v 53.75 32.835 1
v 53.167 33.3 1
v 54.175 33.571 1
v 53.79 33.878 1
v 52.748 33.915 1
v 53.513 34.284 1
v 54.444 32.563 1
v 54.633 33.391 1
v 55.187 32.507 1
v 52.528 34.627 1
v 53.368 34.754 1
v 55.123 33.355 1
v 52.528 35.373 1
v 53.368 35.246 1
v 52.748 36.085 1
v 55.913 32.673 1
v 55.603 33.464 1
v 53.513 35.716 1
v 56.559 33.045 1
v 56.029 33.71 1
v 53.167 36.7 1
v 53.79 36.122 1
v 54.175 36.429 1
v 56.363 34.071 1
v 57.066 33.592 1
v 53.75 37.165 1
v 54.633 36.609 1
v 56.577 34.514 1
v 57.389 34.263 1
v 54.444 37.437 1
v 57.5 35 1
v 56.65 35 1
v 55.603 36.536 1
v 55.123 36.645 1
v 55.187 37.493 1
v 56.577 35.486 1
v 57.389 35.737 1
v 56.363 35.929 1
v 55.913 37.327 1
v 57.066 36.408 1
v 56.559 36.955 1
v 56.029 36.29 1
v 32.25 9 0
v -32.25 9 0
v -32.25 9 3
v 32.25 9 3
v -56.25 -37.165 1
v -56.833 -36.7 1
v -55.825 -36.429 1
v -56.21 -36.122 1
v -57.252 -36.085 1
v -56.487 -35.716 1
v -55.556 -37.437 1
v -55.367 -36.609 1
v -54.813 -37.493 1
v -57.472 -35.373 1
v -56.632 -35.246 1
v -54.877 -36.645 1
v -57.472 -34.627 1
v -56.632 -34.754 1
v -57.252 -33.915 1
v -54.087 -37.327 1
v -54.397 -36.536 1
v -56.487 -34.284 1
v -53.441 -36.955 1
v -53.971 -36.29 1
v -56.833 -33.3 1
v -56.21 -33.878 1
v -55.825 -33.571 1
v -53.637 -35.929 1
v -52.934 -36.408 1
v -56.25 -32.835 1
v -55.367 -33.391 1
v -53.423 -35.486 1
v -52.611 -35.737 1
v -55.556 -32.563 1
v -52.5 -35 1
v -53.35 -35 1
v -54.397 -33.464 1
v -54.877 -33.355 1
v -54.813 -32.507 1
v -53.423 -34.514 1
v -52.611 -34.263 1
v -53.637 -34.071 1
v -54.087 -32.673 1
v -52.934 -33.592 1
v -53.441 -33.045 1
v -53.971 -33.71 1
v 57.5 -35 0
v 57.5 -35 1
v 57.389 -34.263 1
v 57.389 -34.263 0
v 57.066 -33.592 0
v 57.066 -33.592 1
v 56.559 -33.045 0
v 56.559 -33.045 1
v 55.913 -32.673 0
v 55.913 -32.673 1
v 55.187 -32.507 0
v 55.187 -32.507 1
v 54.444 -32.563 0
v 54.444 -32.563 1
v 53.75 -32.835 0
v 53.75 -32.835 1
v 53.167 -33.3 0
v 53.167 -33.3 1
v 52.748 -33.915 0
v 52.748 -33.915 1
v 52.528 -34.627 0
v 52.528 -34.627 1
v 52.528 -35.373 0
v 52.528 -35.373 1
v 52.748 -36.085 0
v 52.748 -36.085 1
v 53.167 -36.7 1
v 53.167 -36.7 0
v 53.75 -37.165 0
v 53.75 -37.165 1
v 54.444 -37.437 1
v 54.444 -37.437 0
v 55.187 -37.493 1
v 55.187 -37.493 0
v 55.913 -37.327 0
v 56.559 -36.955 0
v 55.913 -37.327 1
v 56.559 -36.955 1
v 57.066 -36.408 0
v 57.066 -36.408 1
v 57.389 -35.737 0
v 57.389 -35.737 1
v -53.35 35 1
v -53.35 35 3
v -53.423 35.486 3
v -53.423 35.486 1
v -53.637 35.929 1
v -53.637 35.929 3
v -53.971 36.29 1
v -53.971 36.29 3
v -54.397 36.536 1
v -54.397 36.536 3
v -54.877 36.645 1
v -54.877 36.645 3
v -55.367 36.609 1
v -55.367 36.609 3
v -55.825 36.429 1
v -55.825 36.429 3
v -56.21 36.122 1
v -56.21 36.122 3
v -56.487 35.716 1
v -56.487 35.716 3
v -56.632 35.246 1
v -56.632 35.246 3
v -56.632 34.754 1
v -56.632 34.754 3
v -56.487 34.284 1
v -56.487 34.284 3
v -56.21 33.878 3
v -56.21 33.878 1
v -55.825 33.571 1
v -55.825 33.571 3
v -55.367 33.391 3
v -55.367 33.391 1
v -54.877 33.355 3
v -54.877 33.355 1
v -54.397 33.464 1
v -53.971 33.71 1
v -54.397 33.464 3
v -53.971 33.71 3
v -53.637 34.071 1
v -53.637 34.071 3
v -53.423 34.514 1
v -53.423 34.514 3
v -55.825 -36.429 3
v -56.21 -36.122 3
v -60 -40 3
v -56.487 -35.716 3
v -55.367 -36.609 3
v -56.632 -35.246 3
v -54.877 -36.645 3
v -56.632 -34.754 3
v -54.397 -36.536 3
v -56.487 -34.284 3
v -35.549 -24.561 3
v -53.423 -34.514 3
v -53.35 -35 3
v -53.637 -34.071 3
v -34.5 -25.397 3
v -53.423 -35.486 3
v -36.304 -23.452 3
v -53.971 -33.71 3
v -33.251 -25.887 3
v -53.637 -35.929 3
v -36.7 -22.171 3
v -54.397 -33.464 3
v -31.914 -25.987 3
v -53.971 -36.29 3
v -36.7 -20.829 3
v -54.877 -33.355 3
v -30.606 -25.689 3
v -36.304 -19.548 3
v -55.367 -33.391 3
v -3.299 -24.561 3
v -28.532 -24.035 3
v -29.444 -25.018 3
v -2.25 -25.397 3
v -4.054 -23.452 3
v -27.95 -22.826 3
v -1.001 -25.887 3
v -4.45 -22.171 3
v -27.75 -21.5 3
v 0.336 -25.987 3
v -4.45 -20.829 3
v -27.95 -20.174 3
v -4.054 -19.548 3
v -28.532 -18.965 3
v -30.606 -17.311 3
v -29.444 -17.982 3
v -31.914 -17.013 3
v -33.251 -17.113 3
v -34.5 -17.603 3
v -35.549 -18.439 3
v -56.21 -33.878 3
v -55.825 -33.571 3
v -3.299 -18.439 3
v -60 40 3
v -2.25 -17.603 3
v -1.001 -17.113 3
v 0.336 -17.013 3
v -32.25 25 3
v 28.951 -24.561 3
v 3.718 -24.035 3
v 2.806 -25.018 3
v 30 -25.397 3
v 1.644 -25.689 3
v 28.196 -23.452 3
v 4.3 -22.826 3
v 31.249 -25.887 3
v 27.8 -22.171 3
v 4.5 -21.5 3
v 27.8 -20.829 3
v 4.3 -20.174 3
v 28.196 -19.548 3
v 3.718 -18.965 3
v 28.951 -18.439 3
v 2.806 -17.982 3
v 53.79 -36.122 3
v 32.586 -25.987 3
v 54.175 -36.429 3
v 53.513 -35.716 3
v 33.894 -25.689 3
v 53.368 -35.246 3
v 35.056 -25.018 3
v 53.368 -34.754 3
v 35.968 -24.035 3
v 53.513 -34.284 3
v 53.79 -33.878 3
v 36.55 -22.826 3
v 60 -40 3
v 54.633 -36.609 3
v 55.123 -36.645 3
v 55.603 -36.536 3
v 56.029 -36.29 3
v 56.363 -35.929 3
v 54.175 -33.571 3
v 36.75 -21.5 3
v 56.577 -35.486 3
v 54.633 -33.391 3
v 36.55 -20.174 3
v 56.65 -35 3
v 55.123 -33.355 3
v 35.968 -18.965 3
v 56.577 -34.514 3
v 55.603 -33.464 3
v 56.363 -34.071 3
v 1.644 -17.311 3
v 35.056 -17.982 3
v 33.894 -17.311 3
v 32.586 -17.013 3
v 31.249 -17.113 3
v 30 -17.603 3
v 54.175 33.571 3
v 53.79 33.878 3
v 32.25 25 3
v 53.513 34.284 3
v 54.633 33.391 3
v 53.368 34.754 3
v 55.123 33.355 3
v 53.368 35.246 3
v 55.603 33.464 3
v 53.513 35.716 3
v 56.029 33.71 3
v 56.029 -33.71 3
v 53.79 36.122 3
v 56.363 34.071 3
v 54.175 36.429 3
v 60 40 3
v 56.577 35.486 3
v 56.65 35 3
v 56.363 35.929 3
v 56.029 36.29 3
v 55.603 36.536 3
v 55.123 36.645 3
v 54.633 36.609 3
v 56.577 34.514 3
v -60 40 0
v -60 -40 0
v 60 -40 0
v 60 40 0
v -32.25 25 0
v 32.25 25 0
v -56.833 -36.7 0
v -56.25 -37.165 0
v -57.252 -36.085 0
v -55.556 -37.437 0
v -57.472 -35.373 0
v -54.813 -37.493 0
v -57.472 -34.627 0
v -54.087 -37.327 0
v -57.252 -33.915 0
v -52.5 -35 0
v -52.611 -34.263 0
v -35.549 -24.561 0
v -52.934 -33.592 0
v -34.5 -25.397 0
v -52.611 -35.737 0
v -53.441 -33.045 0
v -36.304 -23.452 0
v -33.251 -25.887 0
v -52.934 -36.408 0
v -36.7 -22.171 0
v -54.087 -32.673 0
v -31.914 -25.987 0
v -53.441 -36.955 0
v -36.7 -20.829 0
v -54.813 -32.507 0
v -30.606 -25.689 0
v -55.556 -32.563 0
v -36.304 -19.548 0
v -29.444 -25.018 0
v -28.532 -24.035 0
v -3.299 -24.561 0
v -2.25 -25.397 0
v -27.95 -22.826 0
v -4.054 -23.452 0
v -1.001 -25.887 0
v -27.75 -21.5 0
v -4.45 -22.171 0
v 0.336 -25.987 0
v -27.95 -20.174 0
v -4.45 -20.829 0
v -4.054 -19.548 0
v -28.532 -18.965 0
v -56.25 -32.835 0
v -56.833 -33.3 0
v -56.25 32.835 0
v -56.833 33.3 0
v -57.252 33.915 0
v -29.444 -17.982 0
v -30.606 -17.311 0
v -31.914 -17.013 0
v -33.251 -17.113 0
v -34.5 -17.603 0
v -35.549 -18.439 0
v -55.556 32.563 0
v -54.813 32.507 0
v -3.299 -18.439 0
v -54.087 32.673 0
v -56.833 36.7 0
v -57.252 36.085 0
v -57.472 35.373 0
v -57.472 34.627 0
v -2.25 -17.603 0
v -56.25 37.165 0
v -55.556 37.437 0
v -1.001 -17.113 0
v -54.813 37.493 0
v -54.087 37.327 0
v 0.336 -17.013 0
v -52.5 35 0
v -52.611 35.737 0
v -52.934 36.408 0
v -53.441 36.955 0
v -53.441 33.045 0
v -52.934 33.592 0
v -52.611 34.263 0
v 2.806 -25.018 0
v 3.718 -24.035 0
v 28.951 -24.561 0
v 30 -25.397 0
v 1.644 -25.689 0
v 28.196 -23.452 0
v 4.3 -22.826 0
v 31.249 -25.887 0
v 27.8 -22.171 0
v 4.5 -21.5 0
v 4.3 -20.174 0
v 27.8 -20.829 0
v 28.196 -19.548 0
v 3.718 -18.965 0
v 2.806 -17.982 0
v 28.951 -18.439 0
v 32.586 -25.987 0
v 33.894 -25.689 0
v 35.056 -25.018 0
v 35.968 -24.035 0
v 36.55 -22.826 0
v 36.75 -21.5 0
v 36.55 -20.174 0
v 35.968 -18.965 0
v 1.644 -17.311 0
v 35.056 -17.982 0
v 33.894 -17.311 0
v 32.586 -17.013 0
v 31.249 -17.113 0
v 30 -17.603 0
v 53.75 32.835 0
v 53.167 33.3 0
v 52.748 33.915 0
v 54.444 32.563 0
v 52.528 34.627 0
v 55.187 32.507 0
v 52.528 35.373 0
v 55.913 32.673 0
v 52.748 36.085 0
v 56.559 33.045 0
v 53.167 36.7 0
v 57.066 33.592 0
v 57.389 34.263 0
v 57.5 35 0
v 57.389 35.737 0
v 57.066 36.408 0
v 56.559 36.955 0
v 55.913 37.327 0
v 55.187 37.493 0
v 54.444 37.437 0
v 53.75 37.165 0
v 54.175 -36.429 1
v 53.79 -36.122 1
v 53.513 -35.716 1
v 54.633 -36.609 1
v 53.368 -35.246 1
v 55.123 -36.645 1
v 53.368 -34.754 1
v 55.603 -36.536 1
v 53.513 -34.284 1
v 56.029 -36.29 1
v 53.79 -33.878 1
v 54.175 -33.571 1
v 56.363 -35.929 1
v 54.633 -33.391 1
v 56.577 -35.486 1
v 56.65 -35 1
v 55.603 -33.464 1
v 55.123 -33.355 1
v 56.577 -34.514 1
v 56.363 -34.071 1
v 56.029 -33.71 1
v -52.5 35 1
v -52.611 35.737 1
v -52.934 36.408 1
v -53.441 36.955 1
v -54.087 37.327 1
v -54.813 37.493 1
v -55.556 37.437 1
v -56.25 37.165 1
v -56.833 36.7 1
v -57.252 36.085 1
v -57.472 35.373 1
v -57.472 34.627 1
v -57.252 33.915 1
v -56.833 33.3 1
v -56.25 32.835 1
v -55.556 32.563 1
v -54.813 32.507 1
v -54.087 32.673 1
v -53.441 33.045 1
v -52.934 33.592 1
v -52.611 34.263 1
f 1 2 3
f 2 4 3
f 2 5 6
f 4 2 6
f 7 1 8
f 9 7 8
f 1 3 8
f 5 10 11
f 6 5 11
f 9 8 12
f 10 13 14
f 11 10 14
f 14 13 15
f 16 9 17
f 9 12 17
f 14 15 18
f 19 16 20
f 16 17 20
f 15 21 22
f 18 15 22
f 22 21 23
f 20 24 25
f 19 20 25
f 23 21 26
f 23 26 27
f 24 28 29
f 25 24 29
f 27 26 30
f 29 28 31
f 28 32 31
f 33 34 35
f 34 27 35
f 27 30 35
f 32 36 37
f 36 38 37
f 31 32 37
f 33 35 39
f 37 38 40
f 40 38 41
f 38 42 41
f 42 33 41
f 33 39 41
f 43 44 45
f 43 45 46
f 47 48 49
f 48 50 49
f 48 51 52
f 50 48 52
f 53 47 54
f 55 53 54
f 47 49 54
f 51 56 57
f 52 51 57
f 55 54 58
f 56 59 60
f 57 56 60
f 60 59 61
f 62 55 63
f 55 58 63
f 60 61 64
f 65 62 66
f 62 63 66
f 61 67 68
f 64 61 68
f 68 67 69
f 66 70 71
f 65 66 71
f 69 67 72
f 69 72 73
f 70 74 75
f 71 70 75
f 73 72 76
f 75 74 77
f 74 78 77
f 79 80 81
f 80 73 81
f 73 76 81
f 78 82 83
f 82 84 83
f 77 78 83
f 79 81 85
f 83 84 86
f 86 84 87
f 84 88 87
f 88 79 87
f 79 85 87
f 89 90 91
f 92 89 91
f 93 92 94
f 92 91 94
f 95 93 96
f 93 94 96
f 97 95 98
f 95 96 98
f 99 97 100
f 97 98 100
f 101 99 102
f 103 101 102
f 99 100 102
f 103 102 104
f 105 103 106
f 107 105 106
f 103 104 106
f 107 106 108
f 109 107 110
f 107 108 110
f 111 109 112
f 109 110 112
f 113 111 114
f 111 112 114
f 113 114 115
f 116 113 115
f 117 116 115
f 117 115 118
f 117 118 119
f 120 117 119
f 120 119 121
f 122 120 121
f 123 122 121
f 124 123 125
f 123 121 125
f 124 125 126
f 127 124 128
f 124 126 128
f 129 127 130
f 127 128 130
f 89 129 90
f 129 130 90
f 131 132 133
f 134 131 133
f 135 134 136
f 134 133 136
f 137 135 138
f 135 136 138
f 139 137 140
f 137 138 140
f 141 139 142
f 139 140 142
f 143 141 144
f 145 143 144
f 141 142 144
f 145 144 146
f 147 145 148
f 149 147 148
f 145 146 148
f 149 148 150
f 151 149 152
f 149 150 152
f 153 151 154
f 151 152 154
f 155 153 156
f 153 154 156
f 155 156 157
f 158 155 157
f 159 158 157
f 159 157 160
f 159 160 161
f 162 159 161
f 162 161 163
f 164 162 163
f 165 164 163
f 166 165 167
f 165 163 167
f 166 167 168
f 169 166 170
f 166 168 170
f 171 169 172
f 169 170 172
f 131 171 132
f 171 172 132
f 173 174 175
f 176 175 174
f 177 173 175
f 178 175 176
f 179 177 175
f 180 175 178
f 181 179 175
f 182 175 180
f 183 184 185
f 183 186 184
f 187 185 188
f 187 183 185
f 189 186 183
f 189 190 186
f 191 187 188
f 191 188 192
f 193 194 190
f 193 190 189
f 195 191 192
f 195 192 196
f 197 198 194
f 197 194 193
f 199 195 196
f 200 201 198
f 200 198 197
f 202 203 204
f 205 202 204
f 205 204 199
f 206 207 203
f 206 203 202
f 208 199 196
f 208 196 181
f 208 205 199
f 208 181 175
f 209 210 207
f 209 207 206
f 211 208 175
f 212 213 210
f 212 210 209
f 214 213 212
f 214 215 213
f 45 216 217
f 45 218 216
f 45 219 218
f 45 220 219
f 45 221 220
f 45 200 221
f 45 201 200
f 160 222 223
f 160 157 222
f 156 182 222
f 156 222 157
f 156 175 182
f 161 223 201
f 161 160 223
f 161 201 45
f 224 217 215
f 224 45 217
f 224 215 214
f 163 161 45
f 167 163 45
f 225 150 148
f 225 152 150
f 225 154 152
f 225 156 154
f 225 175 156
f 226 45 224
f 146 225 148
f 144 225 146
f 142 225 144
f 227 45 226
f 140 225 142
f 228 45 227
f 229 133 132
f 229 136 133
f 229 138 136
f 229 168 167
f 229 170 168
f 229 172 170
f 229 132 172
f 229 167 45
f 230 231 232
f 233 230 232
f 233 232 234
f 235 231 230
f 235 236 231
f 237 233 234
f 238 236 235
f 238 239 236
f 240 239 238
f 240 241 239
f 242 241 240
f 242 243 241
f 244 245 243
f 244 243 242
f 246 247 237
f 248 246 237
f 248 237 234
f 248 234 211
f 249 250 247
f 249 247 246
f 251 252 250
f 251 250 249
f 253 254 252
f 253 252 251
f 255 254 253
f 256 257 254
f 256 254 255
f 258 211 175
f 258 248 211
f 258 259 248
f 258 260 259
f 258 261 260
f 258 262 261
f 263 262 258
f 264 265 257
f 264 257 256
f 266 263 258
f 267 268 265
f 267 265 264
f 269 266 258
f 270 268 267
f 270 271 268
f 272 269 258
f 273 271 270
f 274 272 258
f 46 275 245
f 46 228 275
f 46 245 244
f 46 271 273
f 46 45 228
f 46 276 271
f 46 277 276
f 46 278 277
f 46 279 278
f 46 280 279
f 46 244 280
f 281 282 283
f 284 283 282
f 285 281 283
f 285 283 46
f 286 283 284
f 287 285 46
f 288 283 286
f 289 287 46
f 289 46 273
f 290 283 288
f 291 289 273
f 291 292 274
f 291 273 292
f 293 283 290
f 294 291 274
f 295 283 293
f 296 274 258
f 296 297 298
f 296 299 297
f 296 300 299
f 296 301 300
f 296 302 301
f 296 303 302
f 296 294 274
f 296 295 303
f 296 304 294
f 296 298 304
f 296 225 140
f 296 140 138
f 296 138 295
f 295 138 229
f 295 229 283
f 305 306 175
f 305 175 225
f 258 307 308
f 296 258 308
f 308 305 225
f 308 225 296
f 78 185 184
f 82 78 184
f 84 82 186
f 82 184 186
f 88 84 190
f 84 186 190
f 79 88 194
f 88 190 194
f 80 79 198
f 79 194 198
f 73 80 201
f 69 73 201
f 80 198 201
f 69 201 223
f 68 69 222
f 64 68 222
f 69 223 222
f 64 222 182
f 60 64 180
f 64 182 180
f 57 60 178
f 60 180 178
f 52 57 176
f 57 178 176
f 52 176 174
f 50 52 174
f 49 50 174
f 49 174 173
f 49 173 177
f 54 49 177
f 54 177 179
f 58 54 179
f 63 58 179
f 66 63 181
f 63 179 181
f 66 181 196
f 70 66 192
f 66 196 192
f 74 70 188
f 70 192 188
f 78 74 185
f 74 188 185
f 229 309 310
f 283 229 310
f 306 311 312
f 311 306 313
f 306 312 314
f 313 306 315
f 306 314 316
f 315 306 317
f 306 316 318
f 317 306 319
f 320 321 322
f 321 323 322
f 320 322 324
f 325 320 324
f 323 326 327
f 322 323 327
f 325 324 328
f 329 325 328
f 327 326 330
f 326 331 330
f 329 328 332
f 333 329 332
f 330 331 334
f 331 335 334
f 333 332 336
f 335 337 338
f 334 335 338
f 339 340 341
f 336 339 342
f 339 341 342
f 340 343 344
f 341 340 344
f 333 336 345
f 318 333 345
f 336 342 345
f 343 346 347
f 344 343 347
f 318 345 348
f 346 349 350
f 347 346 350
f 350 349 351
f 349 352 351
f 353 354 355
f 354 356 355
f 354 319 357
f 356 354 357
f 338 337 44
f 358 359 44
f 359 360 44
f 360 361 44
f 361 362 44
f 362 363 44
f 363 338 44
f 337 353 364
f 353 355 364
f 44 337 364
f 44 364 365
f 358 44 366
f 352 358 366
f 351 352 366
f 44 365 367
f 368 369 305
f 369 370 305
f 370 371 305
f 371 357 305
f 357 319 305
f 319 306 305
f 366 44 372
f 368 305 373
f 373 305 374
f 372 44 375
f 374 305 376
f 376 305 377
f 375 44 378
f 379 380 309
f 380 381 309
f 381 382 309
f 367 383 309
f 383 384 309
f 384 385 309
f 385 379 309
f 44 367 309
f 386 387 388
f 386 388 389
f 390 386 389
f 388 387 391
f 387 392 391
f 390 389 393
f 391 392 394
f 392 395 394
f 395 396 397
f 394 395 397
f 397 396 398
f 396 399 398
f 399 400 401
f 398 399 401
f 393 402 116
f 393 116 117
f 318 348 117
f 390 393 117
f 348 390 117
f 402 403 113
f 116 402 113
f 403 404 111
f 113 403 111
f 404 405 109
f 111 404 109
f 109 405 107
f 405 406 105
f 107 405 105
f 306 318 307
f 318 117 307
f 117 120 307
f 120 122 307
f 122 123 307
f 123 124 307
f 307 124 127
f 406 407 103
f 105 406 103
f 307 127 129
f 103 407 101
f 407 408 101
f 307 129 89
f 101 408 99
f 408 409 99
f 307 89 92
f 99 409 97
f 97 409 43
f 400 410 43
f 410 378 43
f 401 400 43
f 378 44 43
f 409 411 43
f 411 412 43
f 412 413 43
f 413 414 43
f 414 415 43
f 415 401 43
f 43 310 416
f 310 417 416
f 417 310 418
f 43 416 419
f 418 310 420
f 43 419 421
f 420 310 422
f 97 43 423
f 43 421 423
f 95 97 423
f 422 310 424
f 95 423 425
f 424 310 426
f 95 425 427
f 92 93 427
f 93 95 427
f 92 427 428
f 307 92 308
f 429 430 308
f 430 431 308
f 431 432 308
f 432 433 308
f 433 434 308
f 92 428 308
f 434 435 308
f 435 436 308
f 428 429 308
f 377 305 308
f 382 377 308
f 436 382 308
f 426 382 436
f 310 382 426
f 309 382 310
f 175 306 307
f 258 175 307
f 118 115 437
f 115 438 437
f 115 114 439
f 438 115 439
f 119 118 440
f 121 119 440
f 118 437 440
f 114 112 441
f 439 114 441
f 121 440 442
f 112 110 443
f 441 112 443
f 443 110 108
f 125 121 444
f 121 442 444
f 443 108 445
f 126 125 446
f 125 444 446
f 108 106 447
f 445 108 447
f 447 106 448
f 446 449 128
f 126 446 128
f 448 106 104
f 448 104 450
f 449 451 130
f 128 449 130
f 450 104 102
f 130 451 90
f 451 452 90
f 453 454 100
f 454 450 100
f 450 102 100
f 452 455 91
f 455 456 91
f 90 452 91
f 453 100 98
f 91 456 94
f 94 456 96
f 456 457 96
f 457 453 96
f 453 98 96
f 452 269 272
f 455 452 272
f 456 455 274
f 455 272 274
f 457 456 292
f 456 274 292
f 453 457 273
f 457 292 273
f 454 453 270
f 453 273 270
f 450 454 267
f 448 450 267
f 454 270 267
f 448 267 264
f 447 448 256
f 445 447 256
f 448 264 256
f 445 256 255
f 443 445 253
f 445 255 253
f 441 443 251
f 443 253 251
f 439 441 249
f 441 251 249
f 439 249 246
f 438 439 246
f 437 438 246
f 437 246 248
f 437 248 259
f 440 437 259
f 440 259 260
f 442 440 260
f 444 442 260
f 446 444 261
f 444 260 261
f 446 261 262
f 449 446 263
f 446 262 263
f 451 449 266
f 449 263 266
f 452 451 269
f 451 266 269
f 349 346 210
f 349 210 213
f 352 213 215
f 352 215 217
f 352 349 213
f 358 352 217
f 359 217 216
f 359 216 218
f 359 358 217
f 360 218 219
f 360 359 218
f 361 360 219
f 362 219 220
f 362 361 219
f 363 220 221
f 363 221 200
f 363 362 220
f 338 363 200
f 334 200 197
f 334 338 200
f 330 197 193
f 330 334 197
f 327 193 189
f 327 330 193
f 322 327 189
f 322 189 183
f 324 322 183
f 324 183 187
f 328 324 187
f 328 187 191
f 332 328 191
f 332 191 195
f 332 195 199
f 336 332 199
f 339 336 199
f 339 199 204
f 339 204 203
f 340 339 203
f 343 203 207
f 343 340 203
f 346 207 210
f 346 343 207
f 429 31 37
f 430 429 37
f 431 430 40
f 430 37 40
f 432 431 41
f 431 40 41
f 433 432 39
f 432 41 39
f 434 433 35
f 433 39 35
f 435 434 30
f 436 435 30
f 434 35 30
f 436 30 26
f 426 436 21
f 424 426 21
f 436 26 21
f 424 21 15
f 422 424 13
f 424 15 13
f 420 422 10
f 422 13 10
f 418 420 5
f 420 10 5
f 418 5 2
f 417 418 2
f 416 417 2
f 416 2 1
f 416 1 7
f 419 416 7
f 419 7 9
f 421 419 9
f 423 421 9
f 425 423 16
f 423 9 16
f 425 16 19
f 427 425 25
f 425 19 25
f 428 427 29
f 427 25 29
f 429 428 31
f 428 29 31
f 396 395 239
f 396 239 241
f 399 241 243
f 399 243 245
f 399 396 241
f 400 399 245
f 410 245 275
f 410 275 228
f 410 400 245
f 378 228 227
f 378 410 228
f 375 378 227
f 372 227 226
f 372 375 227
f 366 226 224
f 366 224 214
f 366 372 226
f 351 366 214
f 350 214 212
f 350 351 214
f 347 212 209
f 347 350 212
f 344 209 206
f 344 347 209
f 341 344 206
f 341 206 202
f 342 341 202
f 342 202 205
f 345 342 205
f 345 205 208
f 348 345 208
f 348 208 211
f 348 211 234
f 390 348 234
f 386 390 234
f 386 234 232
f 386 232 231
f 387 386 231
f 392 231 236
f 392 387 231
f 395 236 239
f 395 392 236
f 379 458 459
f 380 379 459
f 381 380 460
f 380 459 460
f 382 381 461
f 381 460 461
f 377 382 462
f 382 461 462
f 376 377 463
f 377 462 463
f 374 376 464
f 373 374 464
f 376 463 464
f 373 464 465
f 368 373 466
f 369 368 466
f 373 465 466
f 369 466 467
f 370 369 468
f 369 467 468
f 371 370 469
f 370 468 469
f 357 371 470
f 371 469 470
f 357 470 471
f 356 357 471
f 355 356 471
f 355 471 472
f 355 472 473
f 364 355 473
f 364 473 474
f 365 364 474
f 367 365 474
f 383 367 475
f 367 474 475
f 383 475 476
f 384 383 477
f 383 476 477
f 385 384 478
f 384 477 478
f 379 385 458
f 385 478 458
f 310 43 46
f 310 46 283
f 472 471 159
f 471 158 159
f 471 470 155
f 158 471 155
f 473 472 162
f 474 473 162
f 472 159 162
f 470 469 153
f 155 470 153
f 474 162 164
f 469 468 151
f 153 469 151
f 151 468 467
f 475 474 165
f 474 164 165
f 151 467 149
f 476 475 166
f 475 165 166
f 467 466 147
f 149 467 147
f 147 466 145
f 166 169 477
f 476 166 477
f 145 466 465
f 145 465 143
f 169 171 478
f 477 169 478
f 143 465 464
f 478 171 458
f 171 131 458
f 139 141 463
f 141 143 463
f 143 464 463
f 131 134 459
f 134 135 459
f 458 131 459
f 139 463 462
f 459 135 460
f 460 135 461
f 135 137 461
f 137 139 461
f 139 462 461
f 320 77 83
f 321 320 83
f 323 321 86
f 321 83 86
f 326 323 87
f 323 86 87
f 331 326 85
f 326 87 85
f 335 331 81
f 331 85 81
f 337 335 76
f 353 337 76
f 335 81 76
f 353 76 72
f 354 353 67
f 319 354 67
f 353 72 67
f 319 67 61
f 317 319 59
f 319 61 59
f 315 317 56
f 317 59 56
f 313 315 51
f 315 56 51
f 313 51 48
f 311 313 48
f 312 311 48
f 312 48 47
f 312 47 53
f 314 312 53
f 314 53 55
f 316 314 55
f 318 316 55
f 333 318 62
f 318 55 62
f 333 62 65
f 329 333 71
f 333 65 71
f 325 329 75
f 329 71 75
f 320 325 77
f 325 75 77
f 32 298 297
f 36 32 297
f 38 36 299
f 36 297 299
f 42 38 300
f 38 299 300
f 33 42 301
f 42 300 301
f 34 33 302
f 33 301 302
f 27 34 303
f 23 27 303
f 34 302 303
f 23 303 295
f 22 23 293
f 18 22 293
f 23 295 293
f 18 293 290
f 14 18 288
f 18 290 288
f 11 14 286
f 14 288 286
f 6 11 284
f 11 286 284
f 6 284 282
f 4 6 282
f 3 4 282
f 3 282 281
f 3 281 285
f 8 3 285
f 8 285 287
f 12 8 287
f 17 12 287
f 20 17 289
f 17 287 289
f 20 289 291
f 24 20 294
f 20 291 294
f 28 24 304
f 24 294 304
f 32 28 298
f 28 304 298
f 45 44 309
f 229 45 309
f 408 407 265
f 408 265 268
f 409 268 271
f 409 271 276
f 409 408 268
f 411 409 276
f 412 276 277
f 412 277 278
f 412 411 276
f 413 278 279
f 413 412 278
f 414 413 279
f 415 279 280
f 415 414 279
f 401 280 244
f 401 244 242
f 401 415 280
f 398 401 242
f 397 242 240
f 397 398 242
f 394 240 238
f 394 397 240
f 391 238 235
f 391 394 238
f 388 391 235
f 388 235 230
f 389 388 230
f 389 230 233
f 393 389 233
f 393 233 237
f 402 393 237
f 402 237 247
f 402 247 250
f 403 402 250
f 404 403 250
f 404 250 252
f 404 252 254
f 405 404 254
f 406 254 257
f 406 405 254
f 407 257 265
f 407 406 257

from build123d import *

# Parameters (mm, degrees)
SKICA1_W                 = 120
SKICA1_H                 = 80
P_IDAT_VYSUNUT_M3_DEPTH  = 3
SKICA1_4_OUTSIDE_W       = 150.85
SKICA1_4_OUTSIDE_H       = 110.85
SKICA1_4_OUTSIDE_W_2     = 120
SKICA1_4_OUTSIDE_H_2     = 80
SKICA1_4_OUTSIDE_R       = 4.5
SKICA1_4_OUTSIDE_W_3     = 64.5
SKICA1_4_OUTSIDE_H_3     = 16
ODEBRAT_VYSUNUT_M1_DEPTH = 3
SKICA5_R                 = 1.65
ODEBRAT_VYSUNUT_M3_DEPTH = 2
SKICA6_R                 = 2.5
ODEBRAT_VYSUNUT_M6_DEPTH = 1


with BuildPart() as part:
    # Skica1 → Přidat vysunutím3 (new body)
    with BuildSketch(Plane.XY):
        Rectangle(SKICA1_W, SKICA1_H)
    extrude(amount=P_IDAT_VYSUNUT_M3_DEPTH)

    # Skica1<4> outside → Odebrat vysunutím1 (cut)
    # profile 1 of 5: a face of its own
    with BuildSketch(Plane.XY):
        Rectangle(SKICA1_4_OUTSIDE_W, SKICA1_4_OUTSIDE_H)
        Rectangle(SKICA1_4_OUTSIDE_W_2, SKICA1_4_OUTSIDE_H_2, mode=Mode.SUBTRACT)
    # profile 2 of 5: a face of its own
    with BuildSketch(Plane.XY):
        with Locations((-32.25, -21.5)):
            Circle(SKICA1_4_OUTSIDE_R)
    # profile 3 of 5: a face of its own
    with BuildSketch(Plane.XY):
        with Locations((0, -21.5)):
            Circle(SKICA1_4_OUTSIDE_R)
    # profile 4 of 5: a face of its own
    with BuildSketch(Plane.XY):
        with Locations((32.25, -21.5)):
            Circle(SKICA1_4_OUTSIDE_R)
    # profile 5 of 5: a face of its own
    with BuildSketch(Plane.XY):
        with Locations((0, 17)):
            Rectangle(SKICA1_4_OUTSIDE_W_3, SKICA1_4_OUTSIDE_H_3)
    extrude(amount=ODEBRAT_VYSUNUT_M1_DEPTH, mode=Mode.SUBTRACT)

    # Skica5 → Odebrat vysunutím3 (cut)
    with BuildSketch(Plane.XY.offset(3)):
        with Locations((-55, 35)):
            Circle(SKICA5_R)
        with Locations((55, 35)):
            Circle(SKICA5_R)
        with Locations((-55, -35)):
            Circle(SKICA5_R)
        with Locations((55, -35)):
            Circle(SKICA5_R)
    extrude(amount=-ODEBRAT_VYSUNUT_M3_DEPTH, mode=Mode.SUBTRACT)

    # Skica6 → Odebrat vysunutím6 (cut)
    with BuildSketch(Plane.XY.offset(1)):
        with Locations((-55, 35)):
            Circle(SKICA6_R)
        with Locations((55, 35)):
            Circle(SKICA6_R)
        with Locations((55, -35)):
            Circle(SKICA6_R)
        with Locations((-55, -35)):
            Circle(SKICA6_R)
    extrude(amount=-ODEBRAT_VYSUNUT_M6_DEPTH, mode=Mode.SUBTRACT)


solid = part.part
